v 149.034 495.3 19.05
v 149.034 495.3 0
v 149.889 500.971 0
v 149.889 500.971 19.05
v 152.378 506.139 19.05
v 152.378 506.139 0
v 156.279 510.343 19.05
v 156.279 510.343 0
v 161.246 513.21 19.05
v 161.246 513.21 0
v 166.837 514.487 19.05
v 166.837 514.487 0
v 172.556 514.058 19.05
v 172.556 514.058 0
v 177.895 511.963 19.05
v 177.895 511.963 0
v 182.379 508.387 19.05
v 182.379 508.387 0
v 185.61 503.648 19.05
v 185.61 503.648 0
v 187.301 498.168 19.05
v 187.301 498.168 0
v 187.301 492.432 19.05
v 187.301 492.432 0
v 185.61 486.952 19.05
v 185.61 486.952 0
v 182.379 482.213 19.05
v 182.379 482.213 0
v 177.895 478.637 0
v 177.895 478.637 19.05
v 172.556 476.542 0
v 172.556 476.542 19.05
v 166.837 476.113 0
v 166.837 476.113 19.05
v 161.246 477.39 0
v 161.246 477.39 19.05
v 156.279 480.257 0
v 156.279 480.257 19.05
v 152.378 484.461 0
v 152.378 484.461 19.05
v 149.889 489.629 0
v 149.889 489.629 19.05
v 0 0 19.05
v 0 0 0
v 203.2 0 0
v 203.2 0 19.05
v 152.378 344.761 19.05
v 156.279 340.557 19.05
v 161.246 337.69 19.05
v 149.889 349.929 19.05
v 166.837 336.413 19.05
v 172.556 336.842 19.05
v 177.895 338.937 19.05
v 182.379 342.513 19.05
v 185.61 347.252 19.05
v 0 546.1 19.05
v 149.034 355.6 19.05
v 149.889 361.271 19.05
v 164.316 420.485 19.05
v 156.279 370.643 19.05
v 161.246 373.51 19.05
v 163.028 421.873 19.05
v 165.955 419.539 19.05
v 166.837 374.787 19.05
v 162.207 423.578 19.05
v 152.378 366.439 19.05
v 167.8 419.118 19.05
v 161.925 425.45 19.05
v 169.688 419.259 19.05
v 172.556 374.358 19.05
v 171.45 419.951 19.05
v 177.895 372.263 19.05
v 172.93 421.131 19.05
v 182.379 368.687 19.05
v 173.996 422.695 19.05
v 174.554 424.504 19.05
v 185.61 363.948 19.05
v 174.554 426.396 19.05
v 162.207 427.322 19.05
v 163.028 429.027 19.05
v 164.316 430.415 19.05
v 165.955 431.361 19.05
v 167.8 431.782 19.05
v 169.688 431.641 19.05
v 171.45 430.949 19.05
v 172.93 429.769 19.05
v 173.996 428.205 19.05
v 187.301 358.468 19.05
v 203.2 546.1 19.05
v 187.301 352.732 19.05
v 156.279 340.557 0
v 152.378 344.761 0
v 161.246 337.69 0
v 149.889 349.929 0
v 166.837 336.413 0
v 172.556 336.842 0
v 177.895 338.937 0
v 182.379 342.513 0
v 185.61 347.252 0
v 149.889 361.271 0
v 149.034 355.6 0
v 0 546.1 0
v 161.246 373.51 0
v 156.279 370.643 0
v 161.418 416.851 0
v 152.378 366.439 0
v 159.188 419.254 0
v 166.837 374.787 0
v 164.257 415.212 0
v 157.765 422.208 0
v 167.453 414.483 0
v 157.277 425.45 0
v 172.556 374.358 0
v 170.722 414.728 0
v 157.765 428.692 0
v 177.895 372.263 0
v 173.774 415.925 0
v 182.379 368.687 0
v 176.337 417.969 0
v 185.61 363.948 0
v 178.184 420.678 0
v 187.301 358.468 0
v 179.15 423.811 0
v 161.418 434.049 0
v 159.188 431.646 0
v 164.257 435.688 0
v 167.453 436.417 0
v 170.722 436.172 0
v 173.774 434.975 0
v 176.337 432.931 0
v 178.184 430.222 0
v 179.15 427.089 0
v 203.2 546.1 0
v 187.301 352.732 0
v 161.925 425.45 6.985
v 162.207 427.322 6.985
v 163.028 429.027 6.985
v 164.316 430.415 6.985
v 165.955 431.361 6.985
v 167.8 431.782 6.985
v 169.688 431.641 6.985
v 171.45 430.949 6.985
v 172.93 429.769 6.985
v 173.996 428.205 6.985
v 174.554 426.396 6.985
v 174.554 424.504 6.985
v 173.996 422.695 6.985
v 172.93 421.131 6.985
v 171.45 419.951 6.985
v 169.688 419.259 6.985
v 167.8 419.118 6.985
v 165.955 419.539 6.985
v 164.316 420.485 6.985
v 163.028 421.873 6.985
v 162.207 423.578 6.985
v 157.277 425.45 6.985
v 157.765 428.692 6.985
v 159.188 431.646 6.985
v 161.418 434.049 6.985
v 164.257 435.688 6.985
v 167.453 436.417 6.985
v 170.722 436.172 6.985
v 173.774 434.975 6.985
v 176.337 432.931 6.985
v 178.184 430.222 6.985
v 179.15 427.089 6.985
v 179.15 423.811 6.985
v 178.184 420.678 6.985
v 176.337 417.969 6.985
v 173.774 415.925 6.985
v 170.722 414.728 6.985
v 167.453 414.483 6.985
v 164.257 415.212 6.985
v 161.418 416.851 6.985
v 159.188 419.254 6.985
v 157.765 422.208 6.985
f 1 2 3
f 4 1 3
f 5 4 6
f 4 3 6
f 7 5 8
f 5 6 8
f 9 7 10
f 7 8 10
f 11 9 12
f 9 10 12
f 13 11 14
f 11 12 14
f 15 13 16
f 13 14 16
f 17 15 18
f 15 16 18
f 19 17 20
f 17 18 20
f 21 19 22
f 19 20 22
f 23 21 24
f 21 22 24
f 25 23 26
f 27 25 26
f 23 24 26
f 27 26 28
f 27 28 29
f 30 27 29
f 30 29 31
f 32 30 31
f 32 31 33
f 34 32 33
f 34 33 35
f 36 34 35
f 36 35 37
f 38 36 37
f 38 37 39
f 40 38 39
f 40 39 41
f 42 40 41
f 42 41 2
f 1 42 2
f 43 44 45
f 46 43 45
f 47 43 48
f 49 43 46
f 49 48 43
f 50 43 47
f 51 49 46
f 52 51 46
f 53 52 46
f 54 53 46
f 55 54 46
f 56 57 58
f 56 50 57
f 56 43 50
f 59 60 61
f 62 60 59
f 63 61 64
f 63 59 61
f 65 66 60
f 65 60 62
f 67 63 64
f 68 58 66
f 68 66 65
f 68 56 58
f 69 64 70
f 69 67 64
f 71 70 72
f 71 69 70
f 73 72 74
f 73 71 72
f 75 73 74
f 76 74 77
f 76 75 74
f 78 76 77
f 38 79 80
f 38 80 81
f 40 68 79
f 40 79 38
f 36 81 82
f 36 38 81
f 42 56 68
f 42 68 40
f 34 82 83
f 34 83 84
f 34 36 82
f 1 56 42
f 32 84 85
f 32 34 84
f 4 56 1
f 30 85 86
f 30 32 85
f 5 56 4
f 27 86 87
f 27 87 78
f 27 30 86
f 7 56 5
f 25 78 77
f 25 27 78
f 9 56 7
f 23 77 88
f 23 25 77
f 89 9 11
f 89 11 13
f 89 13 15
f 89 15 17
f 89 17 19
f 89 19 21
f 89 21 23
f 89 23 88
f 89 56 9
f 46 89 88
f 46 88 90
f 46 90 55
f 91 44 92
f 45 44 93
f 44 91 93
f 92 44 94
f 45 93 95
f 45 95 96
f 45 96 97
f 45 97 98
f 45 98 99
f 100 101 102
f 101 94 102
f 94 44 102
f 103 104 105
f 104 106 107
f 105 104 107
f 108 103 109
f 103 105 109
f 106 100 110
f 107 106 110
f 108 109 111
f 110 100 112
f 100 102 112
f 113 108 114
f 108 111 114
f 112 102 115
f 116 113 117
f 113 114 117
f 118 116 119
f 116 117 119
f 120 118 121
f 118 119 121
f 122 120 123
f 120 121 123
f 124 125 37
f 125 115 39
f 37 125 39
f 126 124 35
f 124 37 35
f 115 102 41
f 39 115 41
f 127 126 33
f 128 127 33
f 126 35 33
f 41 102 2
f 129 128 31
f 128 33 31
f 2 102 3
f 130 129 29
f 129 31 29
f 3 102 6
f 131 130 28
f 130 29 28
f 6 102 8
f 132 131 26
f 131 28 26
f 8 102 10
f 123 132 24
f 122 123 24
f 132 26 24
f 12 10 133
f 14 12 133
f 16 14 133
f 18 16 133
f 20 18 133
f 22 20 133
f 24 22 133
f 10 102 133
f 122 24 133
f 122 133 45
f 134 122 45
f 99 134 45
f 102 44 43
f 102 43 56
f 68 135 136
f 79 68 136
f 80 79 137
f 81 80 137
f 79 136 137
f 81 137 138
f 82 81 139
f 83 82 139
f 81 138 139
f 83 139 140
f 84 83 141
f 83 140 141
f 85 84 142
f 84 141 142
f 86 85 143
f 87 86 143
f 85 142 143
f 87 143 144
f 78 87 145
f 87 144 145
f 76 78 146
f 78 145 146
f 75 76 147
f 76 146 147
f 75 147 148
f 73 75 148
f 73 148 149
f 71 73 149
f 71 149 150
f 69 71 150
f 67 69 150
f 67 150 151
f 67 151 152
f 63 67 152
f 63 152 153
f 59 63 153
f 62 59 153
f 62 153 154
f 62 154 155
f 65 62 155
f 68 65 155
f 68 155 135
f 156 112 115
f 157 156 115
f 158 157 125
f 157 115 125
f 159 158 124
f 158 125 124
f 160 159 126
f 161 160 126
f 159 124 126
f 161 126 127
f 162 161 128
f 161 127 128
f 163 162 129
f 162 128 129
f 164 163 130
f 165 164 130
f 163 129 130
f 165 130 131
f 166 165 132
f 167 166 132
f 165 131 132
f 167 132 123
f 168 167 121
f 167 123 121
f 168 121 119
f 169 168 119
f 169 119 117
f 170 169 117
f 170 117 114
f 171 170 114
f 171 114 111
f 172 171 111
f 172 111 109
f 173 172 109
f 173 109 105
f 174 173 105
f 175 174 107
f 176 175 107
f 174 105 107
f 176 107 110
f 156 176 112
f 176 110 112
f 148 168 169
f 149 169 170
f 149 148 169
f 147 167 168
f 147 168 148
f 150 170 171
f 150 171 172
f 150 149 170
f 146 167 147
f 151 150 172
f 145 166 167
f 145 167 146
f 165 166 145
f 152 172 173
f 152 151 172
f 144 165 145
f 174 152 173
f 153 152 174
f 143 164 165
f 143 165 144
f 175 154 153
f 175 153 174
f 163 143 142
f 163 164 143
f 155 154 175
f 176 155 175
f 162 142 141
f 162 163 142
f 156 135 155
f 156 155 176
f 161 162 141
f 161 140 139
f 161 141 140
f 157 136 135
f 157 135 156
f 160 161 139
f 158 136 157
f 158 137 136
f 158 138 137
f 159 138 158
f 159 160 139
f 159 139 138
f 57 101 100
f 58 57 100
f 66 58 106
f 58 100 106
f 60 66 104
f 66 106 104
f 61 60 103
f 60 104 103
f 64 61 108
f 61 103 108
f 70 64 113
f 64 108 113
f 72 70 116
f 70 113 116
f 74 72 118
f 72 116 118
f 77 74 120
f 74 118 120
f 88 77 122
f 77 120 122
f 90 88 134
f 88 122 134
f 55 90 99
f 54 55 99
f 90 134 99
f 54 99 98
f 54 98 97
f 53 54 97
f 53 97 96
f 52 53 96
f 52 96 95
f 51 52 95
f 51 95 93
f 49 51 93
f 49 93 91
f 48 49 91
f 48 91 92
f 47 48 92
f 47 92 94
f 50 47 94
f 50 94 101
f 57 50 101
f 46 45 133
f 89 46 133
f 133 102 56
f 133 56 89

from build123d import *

# Parameters (mm, degrees)
SKETCH1_W               = 203.2
SKETCH1_H               = 546.1
BOSS_EXTRUDE1_DEPTH     = 19.05
SKETCH2_R               = 19.2405
CUT_EXTRUDE1_DEPTH      = 583.990868282
ESQUISSE1_R             = 10.9982
ENL_V_MAT_EXTRU_1_DEPTH = 6.985
ESQUISSE2_R             = 6.35
ENL_V_MAT_EXTRU_2_DEPTH = 583.804439092


with BuildPart() as part:
    # Sketch1 → Boss-Extrude1 (new body)
    with BuildSketch(Plane.XY):
        with Locations((101.6, 273.05)):
            Rectangle(SKETCH1_W, SKETCH1_H)
    extrude(amount=BOSS_EXTRUDE1_DEPTH)

    # Sketch2 → Cut-Extrude1 (cut, through all)
    with BuildSketch(Plane(origin=(0, 0, 0), x_dir=(-1, 0, 0), z_dir=(0, 0, -1))):
        with Locations((-168.275, 495.3)):
            Circle(SKETCH2_R)
        with Locations((-168.275, 355.6)):
            Circle(SKETCH2_R)
    extrude(amount=-CUT_EXTRUDE1_DEPTH, mode=Mode.SUBTRACT)

    # Esquisse1 → Enlèv. mat.-Extru.1 (cut)
    with BuildSketch(Plane(origin=(0, 0, 0), x_dir=(-1, 0, 0), z_dir=(0, 0, -1))):
        with Locations((-168.275, 425.45)):
            Circle(ESQUISSE1_R)
    extrude(amount=-ENL_V_MAT_EXTRU_1_DEPTH, mode=Mode.SUBTRACT)

    # Esquisse2 → Enlèv. mat.-Extru.2 (cut, through all)
    with BuildSketch(Plane(origin=(0, 0, 6.985), x_dir=(-1, 0, 0), z_dir=(0, 0, -1))):
        with Locations((-168.275, 425.45)):
            Circle(ESQUISSE2_R)
    extrude(amount=-ENL_V_MAT_EXTRU_2_DEPTH, mode=Mode.SUBTRACT)


solid = part.part
